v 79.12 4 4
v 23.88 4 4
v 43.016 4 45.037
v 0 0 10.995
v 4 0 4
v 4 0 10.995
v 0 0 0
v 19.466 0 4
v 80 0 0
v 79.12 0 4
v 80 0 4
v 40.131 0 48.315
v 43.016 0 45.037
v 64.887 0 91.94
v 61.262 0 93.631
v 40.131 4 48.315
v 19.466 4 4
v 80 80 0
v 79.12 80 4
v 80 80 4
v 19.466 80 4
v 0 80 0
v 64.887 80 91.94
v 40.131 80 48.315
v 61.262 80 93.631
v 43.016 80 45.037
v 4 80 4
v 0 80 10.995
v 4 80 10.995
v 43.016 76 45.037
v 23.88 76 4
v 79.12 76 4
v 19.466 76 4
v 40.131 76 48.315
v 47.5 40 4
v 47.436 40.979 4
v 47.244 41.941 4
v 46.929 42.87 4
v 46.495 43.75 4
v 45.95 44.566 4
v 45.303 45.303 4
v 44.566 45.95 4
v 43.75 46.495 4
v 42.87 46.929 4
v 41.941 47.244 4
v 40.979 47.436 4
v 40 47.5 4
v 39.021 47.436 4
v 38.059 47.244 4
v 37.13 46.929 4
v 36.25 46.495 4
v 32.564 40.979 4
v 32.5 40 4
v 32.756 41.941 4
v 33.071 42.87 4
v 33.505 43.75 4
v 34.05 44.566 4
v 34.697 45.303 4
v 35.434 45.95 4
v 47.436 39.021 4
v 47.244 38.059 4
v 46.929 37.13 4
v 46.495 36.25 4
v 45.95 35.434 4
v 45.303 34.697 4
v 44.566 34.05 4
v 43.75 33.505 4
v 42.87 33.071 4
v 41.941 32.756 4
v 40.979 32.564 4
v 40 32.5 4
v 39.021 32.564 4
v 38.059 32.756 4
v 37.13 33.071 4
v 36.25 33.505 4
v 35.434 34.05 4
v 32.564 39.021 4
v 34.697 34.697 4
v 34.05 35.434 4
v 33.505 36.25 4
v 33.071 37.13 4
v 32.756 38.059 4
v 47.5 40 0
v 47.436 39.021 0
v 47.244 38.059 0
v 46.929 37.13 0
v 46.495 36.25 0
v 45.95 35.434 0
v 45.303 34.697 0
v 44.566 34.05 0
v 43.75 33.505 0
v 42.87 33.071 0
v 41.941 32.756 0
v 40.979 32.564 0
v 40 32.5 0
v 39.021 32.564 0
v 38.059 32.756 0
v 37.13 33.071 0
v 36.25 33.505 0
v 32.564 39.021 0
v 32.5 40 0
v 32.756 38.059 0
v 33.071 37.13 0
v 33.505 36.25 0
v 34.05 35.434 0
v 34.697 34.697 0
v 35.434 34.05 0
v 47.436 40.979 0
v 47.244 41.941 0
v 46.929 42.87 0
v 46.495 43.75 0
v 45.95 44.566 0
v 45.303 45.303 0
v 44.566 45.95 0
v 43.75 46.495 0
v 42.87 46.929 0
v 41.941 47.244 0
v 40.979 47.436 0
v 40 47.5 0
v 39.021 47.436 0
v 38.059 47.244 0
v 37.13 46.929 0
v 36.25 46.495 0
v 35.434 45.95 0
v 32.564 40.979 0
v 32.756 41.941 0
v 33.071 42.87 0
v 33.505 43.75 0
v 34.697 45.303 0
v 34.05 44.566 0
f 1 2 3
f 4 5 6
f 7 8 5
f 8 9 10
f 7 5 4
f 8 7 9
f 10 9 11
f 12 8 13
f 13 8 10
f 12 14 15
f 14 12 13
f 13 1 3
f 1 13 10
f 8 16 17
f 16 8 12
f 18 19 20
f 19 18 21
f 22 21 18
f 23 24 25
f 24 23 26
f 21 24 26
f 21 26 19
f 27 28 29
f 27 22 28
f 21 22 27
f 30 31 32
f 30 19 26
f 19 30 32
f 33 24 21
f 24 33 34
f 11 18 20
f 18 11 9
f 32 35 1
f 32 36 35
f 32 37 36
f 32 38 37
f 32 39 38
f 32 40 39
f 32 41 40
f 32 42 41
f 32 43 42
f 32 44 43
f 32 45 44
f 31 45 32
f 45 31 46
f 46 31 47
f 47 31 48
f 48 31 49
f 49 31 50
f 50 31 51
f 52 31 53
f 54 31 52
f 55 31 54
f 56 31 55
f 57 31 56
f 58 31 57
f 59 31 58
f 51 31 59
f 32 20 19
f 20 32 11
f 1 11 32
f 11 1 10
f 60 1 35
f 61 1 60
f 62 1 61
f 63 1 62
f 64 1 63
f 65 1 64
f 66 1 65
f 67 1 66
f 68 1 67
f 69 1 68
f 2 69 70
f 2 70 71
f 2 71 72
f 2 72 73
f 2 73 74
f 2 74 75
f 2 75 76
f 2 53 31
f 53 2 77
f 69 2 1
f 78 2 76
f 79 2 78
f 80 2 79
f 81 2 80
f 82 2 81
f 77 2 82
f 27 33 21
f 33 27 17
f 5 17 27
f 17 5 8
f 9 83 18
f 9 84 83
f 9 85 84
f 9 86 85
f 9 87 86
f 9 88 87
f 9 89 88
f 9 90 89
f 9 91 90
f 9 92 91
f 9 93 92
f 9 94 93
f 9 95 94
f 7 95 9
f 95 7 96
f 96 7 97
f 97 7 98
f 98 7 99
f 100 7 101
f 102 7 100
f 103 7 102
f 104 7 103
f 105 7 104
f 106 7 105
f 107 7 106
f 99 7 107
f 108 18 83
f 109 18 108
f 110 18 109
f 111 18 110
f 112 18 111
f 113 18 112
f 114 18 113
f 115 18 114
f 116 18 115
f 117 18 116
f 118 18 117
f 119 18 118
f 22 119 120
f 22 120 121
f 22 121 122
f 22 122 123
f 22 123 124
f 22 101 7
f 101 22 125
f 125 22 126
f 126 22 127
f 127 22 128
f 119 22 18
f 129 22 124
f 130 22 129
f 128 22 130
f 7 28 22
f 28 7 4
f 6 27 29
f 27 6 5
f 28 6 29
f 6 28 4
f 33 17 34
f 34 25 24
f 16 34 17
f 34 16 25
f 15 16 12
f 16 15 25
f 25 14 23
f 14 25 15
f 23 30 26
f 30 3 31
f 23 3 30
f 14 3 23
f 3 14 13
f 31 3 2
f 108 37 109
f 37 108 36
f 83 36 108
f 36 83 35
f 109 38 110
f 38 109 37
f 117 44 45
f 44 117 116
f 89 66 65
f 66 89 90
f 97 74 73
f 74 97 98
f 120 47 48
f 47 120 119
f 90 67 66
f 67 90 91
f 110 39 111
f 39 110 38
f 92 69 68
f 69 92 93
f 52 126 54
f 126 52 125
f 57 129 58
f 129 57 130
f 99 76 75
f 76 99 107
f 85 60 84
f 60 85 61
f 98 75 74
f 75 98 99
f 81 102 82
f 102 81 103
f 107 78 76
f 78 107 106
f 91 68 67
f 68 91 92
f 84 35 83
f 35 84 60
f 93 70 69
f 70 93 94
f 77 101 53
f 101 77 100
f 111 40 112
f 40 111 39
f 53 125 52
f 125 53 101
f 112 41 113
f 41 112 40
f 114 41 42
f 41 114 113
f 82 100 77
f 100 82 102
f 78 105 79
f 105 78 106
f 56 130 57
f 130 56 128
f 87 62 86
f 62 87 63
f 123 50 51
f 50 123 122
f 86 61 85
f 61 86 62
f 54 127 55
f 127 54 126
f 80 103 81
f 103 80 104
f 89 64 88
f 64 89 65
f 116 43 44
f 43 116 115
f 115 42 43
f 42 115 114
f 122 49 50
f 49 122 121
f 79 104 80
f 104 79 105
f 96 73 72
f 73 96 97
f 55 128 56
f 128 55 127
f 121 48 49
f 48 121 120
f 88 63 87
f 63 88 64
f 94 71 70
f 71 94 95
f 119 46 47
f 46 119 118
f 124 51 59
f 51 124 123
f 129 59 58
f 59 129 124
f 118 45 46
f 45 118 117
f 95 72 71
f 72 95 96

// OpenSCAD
// Adjustable Phone/Tablet Stand
// Parametric stand with customizable angle and size

// === Device Parameters ===
device_width = 80;       // [50:200] Device width in mm
device_thickness = 12;   // [6:20] Device thickness (with case)

// === Stand Parameters ===
stand_angle = 65;        // [45:85] Viewing angle in degrees
stand_depth = 80;        // [50:150] Base depth in mm
stand_height = 100;      // [60:200] Back support height in mm

// === Construction ===
material_thickness = 4;  // [2:0.5:8] Material thickness
slot_depth = 15;         // [10:30] How deep device sits in slot

// === Features ===
cable_hole = true;       // Add cable pass-through hole
cable_diameter = 15;     // [8:25] Cable hole diameter
add_feet = true;         // Add anti-slip feet

// === Internal ===
$fn = 48;
cradle_depth = max(slot_depth, device_thickness / sin(stand_angle));
support_x = material_thickness + cradle_depth;
support_z = material_thickness * 0.75;
lip_height = material_thickness + cradle_depth / tan(stand_angle);

module side_brace() {
    brace_length = min(stand_height / 2, (stand_depth - support_x) / cos(stand_angle));
    rotate([90, 0, 0])
        linear_extrude(height=material_thickness)
            polygon([
                [support_x, support_z],
                [stand_depth, support_z],
                [support_x + brace_length * cos(stand_angle),
                 support_z + brace_length * sin(stand_angle)]
            ]);
}

module back_support() {
    // The support rises from just behind the cradle and overlaps the base.
    translate([support_x, 0, support_z])
        rotate([0, -stand_angle, 0])
            translate([0, 0, -material_thickness])
                cube([stand_height, device_width, material_thickness]);
}

module cable_cutout() {
    if (cable_hole) {
        translate([stand_depth/2, device_width/2, -1])
            cylinder(h = material_thickness + 2, d = cable_diameter);
    }
}

module foot() {
    cylinder(h = 2, d1 = 10, d2 = 8);
}

module stand() {
    assert(stand_depth > support_x, "Stand depth must leave room for the cradle and support.");
    difference() {
        union() {
            for (y = [material_thickness, device_width])
                translate([0, y, 0]) side_brace();

            // Base plate
            cube([stand_depth, device_width, material_thickness]);

            // Front lip
            cube([material_thickness, device_width, lip_height]);

            // Back support
            back_support();
        }

        // Cable hole
        cable_cutout();
    }

    // Feet
    if (add_feet) {
        translate([10, 10, 0]) foot();
        translate([10, device_width - 10, 0]) foot();
        translate([stand_depth - 10, 10, 0]) foot();
        translate([stand_depth - 10, device_width - 10, 0]) foot();
    }
}

stand();
